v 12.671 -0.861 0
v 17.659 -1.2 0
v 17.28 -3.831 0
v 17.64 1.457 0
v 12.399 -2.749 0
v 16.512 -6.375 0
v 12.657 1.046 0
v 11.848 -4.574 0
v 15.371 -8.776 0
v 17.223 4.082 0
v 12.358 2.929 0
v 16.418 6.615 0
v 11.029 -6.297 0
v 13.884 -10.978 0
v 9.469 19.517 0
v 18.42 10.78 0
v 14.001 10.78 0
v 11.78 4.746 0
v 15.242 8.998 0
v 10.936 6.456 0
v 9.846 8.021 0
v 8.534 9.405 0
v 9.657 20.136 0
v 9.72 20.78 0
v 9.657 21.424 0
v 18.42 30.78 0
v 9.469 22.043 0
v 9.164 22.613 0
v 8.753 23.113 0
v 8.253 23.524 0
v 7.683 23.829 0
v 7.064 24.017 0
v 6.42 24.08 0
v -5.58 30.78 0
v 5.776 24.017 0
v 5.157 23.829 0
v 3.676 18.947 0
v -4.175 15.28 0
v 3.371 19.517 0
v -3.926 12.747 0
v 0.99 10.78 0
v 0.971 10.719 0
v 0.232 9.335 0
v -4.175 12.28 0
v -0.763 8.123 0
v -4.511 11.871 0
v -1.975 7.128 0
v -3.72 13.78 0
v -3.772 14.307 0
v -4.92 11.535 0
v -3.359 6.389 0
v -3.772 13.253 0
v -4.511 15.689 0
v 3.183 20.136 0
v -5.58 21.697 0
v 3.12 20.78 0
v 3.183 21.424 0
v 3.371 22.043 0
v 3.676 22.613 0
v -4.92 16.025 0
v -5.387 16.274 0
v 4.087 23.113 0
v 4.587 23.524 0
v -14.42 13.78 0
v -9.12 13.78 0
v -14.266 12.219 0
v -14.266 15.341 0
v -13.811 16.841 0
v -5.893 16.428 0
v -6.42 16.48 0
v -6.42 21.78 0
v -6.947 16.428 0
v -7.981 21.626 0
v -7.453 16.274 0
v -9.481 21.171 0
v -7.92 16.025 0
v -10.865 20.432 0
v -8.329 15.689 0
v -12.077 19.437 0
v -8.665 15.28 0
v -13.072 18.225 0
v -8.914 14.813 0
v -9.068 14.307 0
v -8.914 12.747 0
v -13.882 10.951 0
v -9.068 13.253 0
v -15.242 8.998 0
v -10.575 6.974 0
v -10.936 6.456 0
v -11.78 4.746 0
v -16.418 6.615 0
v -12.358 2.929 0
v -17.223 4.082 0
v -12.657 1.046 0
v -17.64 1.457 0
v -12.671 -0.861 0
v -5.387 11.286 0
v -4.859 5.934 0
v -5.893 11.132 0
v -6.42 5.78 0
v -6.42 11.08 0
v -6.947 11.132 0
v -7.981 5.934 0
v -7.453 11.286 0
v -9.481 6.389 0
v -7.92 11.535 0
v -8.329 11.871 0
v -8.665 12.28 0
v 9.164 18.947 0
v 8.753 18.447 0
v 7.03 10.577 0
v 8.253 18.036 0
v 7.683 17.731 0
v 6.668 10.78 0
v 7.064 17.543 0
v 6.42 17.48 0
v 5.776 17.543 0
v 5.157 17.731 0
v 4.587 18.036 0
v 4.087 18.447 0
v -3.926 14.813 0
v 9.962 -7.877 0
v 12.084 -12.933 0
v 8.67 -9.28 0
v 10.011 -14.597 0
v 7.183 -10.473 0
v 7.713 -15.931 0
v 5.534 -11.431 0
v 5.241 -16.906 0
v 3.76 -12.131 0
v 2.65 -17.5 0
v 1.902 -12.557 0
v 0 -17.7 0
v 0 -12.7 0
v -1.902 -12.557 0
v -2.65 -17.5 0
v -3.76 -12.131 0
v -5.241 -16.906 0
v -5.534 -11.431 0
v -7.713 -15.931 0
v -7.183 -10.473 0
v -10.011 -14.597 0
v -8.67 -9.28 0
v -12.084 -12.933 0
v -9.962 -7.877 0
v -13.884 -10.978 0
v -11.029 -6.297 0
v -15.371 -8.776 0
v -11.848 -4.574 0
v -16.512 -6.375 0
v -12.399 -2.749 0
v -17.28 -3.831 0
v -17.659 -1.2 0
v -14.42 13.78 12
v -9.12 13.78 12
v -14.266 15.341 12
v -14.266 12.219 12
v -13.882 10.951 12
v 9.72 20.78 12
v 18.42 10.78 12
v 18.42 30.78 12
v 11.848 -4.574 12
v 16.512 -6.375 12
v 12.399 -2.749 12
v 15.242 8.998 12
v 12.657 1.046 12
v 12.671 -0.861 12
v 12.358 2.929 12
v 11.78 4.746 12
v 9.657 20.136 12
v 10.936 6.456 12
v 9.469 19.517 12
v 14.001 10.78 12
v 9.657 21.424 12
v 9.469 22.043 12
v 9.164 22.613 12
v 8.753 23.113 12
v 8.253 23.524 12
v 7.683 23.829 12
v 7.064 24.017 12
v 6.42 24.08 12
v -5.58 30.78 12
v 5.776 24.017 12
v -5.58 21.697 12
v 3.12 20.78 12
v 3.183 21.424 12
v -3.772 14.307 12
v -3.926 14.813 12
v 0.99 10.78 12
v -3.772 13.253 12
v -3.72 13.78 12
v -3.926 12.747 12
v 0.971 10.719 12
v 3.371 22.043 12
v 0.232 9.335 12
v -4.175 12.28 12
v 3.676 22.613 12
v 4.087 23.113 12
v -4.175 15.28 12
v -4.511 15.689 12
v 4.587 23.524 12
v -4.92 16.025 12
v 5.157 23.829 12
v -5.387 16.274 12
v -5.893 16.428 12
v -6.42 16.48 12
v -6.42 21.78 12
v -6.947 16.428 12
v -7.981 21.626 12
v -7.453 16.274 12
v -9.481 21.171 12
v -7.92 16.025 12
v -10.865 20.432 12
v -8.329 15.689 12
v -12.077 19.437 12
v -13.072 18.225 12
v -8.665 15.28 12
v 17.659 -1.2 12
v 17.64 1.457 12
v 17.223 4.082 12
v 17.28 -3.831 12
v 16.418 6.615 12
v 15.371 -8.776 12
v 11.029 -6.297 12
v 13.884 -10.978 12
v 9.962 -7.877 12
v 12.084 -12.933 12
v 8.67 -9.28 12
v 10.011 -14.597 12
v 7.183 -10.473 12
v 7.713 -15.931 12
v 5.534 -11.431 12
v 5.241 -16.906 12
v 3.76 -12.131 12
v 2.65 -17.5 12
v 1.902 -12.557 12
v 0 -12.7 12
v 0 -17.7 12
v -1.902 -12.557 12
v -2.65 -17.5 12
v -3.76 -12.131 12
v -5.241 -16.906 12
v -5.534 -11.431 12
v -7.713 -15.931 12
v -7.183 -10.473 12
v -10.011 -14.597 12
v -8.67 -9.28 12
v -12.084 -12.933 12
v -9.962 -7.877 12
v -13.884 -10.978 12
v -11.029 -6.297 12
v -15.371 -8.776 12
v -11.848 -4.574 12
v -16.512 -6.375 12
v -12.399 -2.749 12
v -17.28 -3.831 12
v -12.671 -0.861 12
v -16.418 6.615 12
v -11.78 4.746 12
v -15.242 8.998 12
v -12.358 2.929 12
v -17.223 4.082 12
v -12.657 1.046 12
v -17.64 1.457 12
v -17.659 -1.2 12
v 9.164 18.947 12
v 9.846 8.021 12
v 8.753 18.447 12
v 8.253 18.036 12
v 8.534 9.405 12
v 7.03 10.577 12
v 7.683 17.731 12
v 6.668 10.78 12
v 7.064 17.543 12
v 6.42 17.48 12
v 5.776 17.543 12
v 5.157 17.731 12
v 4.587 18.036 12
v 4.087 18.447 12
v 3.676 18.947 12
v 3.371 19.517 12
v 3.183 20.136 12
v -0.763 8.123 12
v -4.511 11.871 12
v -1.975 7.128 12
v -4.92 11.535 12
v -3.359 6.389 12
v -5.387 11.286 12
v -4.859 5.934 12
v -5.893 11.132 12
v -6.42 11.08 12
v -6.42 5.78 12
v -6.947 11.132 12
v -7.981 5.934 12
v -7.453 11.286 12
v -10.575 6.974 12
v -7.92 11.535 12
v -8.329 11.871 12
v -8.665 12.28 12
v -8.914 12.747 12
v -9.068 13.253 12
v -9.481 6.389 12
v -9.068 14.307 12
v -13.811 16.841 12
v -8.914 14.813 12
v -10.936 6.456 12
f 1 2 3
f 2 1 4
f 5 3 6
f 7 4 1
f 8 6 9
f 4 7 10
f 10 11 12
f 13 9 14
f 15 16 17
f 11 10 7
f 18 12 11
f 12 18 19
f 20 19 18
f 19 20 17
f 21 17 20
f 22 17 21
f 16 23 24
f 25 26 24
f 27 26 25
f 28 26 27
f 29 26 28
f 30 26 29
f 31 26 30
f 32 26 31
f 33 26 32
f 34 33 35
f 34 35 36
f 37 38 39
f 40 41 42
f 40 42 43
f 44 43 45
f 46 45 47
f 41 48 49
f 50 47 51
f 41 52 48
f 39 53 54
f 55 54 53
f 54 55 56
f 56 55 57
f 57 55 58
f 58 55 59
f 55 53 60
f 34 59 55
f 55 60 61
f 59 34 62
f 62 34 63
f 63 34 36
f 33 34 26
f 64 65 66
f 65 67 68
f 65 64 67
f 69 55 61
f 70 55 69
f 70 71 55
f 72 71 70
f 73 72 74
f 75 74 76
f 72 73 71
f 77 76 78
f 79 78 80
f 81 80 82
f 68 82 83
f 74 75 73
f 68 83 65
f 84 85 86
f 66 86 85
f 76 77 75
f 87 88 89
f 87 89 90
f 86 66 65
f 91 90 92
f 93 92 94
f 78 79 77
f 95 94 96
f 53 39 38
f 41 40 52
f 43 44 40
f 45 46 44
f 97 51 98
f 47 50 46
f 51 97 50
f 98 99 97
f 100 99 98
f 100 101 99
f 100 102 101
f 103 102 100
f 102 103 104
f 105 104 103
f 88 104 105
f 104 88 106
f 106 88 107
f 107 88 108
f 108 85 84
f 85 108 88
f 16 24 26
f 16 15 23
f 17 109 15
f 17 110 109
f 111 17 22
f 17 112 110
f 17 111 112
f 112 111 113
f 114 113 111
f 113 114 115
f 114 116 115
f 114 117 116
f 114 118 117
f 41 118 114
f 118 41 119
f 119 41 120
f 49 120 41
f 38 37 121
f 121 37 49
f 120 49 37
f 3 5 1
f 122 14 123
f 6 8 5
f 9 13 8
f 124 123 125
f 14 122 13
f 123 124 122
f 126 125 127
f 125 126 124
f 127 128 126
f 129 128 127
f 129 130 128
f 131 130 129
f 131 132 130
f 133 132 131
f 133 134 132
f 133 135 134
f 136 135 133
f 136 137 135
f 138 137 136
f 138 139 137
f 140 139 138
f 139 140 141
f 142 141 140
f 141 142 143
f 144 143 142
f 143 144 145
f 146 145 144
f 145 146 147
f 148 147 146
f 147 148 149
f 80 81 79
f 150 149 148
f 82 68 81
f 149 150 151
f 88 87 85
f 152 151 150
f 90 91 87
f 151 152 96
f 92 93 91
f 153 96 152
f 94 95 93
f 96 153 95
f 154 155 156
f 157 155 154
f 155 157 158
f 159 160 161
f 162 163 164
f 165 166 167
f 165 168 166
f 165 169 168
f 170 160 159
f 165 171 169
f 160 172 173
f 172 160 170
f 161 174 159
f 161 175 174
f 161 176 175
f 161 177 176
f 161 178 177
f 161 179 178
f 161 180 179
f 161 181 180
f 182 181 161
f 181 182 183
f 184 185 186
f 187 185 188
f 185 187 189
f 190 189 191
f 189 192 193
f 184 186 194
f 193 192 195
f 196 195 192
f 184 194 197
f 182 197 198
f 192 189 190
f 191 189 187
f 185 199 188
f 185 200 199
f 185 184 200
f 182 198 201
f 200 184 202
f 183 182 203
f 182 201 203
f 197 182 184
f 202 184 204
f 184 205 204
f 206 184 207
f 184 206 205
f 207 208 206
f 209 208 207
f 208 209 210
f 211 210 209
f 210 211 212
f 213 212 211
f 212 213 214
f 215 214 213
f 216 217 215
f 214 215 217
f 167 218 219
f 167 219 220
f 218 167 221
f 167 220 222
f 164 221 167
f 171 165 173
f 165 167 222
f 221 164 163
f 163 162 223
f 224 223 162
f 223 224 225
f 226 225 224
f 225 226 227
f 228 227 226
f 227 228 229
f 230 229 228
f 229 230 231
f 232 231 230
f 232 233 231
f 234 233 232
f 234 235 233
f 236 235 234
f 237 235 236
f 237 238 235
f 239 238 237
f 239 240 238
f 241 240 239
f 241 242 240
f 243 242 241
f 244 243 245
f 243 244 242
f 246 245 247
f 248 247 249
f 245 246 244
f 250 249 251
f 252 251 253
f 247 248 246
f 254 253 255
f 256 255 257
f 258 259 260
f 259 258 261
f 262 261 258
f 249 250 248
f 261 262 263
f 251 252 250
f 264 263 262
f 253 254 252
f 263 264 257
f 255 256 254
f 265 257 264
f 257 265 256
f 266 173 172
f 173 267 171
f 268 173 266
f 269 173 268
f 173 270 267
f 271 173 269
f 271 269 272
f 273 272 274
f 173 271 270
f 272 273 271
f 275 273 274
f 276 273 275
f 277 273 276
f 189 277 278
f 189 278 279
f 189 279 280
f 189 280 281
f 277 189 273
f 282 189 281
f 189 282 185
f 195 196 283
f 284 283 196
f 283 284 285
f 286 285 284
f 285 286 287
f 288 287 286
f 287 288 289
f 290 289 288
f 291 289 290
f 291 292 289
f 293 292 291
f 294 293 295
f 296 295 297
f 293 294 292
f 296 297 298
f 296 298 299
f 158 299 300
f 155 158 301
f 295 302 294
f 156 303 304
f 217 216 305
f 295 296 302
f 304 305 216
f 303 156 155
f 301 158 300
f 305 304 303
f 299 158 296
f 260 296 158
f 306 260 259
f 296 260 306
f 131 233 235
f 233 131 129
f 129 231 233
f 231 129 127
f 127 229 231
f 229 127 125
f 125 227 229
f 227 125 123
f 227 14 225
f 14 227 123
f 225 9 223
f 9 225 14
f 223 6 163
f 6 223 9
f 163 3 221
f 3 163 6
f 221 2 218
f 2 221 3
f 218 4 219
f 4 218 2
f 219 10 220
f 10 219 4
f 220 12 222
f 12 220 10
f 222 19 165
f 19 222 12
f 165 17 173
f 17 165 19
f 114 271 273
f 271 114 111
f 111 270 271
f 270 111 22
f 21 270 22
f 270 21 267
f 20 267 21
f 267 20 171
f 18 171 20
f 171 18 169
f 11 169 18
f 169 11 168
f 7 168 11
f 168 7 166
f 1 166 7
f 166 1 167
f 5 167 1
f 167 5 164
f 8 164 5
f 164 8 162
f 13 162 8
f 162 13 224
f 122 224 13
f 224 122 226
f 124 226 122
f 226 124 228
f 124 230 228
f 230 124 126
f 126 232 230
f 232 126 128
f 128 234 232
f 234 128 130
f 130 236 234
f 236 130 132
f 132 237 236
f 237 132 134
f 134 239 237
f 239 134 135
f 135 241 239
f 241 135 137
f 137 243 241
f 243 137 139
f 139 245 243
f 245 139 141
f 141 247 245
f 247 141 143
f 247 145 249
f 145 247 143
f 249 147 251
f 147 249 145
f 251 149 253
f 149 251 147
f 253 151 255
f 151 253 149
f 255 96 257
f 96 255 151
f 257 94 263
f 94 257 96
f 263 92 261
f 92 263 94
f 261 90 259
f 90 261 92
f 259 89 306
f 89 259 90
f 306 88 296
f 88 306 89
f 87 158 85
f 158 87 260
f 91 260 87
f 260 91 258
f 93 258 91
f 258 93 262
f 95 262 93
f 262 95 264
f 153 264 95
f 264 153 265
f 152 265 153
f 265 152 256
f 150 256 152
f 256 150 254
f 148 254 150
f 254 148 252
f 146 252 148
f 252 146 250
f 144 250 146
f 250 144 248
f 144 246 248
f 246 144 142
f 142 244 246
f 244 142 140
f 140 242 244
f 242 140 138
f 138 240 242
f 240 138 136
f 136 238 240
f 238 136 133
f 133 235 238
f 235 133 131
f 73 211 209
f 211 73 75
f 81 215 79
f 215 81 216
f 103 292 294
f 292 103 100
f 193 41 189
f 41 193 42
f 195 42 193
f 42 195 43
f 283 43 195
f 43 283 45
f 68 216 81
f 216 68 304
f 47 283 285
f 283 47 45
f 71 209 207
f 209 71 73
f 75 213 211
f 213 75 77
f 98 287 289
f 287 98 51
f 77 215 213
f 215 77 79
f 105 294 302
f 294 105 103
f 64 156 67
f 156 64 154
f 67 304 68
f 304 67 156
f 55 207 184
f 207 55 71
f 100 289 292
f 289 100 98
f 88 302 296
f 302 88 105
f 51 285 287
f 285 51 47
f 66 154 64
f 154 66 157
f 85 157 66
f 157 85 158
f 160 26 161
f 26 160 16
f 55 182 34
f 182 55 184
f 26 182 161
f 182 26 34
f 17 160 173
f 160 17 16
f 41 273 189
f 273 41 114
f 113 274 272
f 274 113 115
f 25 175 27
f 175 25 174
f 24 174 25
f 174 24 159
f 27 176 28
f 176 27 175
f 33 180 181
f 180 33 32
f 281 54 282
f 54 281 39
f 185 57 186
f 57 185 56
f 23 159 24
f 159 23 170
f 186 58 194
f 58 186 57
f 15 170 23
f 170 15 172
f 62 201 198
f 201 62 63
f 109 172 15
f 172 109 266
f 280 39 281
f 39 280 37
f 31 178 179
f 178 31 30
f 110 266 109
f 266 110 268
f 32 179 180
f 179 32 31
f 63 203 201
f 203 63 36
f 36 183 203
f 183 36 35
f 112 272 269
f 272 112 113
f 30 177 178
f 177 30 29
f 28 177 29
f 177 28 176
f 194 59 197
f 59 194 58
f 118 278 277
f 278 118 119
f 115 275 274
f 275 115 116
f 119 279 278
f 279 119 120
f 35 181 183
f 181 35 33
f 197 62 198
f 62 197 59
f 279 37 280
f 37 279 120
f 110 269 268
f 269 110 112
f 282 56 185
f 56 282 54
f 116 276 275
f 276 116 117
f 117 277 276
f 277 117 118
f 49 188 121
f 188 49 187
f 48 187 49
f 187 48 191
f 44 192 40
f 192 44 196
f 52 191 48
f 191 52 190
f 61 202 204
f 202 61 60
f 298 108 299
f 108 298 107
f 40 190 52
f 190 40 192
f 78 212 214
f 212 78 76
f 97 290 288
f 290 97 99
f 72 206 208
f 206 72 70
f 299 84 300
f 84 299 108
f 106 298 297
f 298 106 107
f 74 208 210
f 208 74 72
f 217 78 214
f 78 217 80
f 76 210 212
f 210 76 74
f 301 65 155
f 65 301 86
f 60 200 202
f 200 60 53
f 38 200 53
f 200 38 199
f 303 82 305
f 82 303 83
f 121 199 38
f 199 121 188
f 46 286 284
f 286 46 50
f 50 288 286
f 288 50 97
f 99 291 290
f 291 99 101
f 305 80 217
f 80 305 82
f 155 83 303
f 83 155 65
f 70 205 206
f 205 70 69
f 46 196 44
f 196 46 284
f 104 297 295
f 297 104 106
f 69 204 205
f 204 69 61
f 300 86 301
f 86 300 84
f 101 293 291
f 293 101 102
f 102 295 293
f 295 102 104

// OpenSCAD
$fn = 32;

// ----------------------------------------------------------------------
// Pipe clamp: 35.4 mm ring, 5 mm wall, 12 mm wide
// ----------------------------------------------------------------------

// --- parameters (mm) ---
outer_r = 17.7;           // clamp outside radius
inner_r = 12.7;           // pipe bore radius
band = 5;                 // band thickness
clamp_w = 12;             // clamp width
opening = 50;             // opening angle between the ends
lug_w = 24;               // lug width
lug_len = 20;             // lug length
bolt_d = 6.6;             // bolt hole
knuckle_d = 16;           // hinge knuckle diameter
pin_d = 5.4;              // hinge pin hole

clamp_profile = [[-7.48, 16.042], [-9.798, 14.741], [-11.895, 13.108], [-13.723, 11.179], [-15.242, 8.998], [-16.418, 6.615], [-17.223, 4.082], [-17.64, 1.457], [-17.659, -1.2], [-17.28, -3.831], [-16.512, -6.375], [-15.371, -8.776], [-13.884, -10.978], [-12.084, -12.933], [-10.011, -14.597], [-7.713, -15.931], [-5.241, -16.906], [-2.65, -17.5], [0, -17.7], [2.65, -17.5], [5.241, -16.906], [7.713, -15.931], [10.011, -14.597], [12.084, -12.933], [13.884, -10.978], [15.371, -8.776], [16.512, -6.375], [17.28, -3.831], [17.659, -1.2], [17.64, 1.457], [17.223, 4.082], [16.418, 6.615], [15.242, 8.998], [13.723, 11.179], [11.895, 13.108], [9.798, 14.741], [7.48, 16.042], [5.367, 11.51], [7.03, 10.577], [8.534, 9.405], [9.846, 8.021], [10.936, 6.456], [11.78, 4.746], [12.358, 2.929], [12.657, 1.046], [12.671, -0.861], [12.399, -2.749], [11.848, -4.574], [11.029, -6.297], [9.962, -7.877], [8.67, -9.28], [7.183, -10.473], [5.534, -11.431], [3.76, -12.131], [1.902, -12.557], [0, -12.7], [-1.902, -12.557], [-3.76, -12.131], [-5.534, -11.431], [-7.183, -10.473], [-8.67, -9.28], [-9.962, -7.877], [-11.029, -6.297], [-11.848, -4.574], [-12.399, -2.749], [-12.671, -0.861], [-12.657, 1.046], [-12.358, 2.929], [-11.78, 4.746], [-10.936, 6.456], [-9.846, 8.021], [-8.534, 9.405], [-7.03, 10.577], [-5.367, 11.51]];

difference() {
  union() {
    linear_extrude(height = clamp_w) polygon(clamp_profile);
    /* hinge knuckle, sunk 2 mm into the band end */
    translate([-6.42, 13.78, 0]) cylinder(h = clamp_w, d = knuckle_d);
    /* bolt lug on the other end */
    translate([-5.58, 10.78, 0]) cube([lug_w, 20, clamp_w]);
  }
  translate([6.42, 20.78, -2.5]) cylinder(h = clamp_w + 5, d = bolt_d);
  translate([-6.42, 13.78, -2.5]) cylinder(h = clamp_w + 5, d = pin_d);
}
